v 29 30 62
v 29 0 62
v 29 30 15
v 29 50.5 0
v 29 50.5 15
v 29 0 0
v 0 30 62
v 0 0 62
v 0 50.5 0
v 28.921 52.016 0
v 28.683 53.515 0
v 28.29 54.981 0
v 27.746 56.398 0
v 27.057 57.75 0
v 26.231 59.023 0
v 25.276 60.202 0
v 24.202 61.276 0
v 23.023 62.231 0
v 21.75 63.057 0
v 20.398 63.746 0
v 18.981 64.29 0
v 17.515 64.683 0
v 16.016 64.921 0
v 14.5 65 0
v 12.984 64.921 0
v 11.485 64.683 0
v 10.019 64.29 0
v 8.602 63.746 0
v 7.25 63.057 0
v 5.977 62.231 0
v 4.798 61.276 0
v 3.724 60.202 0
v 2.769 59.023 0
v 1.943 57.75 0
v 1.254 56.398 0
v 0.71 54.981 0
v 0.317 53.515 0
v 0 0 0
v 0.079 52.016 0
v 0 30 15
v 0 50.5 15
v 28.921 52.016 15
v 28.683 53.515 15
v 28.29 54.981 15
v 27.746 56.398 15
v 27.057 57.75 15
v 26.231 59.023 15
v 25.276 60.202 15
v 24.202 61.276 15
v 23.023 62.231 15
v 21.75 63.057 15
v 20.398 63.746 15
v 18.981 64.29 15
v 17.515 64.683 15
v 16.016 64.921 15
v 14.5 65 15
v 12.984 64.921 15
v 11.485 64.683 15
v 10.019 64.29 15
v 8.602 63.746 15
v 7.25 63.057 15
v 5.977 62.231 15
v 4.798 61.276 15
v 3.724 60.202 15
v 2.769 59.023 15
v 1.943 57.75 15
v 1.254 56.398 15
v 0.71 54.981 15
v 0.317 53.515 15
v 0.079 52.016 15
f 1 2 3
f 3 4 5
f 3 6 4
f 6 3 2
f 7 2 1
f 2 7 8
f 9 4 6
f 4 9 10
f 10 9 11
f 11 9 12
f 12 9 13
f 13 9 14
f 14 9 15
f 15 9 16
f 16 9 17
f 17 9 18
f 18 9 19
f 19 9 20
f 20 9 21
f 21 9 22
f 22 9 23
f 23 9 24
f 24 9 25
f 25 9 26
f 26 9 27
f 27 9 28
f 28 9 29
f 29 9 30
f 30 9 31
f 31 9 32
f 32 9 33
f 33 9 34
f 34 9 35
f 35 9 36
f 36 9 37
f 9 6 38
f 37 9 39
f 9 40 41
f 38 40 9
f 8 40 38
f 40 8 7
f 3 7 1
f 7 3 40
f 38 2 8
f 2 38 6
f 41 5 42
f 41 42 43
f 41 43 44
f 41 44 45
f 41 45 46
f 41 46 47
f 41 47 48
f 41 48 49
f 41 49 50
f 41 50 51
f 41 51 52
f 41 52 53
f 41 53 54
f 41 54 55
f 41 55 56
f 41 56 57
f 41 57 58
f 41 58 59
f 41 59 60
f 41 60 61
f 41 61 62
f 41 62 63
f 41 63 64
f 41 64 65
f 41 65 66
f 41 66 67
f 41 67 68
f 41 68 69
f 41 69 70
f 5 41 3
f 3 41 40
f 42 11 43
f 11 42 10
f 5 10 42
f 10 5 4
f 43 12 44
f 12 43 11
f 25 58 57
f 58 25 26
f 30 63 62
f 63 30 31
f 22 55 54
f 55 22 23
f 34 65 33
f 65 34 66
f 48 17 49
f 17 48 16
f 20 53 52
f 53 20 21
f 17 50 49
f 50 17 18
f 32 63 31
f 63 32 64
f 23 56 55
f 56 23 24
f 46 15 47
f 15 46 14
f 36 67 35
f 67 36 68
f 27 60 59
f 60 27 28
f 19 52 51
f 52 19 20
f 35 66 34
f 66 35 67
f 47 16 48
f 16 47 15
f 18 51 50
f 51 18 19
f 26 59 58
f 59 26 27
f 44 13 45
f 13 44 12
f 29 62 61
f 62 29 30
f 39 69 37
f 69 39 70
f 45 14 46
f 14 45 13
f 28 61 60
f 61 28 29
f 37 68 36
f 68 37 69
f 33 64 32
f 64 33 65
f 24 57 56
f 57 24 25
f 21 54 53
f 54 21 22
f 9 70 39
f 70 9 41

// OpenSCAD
$fn=60;

union() {
cube([29, 30, 62]);

cube([29, 65-14.5, 15]);

translate([14.5,65-14.5,0]) cylinder(h=15, r=14.5);
}
